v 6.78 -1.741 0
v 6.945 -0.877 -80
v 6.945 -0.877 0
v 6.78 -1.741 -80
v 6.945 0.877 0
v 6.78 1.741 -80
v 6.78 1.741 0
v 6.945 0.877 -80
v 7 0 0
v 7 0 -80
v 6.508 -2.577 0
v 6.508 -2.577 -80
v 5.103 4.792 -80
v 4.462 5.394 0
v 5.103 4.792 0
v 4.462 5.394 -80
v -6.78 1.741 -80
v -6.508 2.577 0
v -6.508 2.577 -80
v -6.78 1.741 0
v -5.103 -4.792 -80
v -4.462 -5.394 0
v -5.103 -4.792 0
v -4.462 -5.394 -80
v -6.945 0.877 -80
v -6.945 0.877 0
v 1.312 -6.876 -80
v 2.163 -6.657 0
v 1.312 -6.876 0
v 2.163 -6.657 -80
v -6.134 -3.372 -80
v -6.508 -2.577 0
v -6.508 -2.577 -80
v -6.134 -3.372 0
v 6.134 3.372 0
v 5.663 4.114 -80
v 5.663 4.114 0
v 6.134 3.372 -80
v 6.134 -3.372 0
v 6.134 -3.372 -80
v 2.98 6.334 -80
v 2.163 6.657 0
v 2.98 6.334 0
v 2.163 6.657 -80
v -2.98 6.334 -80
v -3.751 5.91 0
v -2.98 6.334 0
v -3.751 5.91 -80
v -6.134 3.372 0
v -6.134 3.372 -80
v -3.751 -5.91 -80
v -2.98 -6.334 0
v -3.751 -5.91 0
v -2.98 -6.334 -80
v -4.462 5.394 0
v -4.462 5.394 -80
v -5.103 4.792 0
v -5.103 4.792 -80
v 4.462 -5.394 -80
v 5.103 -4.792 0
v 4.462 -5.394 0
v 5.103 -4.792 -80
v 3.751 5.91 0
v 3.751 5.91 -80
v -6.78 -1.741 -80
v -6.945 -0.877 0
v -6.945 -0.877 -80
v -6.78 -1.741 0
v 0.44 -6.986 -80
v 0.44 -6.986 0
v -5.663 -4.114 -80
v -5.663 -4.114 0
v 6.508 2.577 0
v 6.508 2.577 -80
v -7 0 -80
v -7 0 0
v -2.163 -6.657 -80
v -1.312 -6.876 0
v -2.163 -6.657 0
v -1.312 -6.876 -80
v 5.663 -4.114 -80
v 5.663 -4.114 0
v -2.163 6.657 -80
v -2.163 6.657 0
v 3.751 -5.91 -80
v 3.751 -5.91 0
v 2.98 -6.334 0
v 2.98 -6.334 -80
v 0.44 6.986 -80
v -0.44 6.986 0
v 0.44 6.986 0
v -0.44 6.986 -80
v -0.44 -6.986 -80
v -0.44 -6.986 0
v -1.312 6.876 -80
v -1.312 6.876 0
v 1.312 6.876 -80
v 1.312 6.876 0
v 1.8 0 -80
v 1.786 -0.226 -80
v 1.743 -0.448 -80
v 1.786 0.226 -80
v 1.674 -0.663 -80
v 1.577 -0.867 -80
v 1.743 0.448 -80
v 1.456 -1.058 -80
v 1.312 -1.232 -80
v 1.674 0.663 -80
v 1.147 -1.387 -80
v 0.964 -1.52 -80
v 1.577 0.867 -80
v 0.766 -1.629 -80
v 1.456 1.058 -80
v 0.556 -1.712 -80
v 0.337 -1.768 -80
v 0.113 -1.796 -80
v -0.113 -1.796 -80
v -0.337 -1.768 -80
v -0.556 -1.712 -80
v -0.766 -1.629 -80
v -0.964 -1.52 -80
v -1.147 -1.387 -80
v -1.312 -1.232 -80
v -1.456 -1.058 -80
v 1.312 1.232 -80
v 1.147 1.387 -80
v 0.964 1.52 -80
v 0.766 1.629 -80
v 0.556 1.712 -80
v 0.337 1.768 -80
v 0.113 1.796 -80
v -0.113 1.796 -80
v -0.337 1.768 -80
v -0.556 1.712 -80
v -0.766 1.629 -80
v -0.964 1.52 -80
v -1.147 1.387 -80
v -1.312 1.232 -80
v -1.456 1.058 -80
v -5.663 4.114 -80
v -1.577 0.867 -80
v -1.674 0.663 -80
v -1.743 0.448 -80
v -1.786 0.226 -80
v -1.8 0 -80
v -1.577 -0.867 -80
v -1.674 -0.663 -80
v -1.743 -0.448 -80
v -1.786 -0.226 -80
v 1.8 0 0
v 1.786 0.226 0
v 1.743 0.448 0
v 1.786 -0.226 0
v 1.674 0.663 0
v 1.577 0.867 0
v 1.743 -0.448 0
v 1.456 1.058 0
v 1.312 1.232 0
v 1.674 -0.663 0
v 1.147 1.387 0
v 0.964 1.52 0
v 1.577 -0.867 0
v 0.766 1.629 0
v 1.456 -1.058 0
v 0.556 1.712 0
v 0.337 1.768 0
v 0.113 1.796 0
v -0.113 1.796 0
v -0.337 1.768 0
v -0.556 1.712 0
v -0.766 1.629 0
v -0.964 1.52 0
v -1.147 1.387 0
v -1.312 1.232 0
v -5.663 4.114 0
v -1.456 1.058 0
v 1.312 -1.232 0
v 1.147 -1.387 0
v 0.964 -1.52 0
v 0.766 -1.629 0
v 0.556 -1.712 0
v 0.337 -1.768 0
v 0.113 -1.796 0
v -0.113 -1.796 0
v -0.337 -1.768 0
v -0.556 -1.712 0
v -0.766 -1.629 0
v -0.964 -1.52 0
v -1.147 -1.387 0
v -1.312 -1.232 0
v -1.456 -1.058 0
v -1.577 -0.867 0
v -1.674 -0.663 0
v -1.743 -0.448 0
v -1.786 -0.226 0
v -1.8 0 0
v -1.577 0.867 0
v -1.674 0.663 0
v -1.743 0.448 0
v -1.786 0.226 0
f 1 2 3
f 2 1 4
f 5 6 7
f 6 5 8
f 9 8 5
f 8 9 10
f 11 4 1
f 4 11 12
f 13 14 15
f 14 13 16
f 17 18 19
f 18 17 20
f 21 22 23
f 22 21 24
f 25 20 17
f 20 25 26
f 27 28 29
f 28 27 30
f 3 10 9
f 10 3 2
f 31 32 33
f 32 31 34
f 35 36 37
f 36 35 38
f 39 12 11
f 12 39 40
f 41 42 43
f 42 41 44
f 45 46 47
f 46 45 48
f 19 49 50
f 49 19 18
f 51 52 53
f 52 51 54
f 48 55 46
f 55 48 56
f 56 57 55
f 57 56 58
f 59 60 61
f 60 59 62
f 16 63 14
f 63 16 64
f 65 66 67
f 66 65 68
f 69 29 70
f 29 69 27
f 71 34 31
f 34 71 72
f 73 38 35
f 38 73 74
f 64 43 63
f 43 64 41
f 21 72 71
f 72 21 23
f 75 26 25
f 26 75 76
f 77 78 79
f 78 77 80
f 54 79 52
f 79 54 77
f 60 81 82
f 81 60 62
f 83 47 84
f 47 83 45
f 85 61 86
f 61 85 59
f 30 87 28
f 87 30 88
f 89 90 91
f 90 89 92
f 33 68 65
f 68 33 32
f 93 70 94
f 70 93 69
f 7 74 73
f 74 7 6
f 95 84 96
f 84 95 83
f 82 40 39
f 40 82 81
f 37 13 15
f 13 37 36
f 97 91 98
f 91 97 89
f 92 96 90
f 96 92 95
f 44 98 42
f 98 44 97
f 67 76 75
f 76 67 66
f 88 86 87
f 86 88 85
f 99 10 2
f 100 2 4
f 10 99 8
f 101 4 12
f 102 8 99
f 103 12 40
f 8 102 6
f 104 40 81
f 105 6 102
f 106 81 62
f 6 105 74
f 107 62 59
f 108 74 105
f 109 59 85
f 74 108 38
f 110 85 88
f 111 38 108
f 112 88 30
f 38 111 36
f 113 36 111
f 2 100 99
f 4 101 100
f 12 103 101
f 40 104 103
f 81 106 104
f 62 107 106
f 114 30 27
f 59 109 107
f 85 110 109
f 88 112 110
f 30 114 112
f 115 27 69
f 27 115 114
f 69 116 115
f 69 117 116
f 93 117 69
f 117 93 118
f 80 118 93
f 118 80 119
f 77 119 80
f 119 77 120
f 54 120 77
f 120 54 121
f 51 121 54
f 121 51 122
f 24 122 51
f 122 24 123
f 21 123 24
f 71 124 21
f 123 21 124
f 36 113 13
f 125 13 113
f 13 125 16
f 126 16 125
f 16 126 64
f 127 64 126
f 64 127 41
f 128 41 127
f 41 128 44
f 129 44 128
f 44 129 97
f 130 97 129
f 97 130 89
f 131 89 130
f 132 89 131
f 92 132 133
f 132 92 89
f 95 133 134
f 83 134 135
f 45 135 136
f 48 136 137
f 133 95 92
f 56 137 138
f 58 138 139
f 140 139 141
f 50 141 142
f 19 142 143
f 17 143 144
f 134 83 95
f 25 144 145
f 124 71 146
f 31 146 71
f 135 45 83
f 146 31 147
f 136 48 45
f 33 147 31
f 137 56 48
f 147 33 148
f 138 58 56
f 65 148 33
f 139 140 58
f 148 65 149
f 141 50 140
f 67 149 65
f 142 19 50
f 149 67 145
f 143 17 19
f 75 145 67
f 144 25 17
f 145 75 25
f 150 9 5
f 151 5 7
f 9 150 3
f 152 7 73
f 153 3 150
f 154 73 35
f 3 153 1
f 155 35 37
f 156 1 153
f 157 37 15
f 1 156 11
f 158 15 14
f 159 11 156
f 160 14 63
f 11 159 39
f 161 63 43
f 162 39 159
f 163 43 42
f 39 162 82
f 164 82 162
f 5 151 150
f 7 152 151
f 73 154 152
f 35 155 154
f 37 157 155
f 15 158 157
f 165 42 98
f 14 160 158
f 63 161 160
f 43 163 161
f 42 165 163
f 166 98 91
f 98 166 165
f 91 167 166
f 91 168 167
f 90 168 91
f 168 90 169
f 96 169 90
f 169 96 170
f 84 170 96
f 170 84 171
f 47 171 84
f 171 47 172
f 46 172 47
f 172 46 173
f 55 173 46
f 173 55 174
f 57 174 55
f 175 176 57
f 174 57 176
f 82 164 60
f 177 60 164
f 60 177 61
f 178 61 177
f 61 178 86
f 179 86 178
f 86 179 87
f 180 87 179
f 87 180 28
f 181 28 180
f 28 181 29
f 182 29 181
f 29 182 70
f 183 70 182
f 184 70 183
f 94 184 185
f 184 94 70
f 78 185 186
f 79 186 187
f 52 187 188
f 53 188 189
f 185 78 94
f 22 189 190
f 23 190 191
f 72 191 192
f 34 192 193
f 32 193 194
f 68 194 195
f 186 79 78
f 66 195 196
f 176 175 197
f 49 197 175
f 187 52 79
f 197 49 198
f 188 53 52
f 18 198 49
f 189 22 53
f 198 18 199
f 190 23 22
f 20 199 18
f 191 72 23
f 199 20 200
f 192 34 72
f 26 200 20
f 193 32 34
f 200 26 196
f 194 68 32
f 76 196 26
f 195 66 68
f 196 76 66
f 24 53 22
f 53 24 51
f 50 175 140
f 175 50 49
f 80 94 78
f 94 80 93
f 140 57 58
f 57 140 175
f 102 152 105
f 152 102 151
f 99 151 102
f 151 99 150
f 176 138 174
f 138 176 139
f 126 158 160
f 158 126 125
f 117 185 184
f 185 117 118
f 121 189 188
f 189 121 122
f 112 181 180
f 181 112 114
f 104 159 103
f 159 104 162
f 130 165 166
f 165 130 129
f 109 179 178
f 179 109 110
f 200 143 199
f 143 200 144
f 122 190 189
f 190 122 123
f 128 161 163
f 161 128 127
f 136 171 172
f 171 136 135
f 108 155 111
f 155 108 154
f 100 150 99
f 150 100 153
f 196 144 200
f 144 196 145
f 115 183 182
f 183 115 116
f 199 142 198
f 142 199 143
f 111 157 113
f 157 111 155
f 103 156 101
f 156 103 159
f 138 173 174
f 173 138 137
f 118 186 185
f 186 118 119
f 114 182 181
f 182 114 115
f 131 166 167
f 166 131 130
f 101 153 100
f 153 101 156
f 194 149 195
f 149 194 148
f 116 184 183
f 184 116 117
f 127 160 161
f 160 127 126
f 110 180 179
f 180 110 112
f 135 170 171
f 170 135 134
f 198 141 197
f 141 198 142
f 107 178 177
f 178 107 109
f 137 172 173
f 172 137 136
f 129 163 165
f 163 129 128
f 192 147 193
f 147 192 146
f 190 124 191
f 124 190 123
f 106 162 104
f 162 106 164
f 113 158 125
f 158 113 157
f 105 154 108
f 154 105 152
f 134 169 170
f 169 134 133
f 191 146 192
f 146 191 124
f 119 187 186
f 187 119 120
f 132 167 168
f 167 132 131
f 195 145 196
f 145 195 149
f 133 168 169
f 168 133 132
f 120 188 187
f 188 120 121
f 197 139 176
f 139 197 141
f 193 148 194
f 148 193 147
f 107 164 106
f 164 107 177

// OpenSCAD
$fn = 50;


difference() {
	union() {
		translate(v = [0, 0, -80.0000000000]) {
			cylinder(h = 80, r = 7.0000000000);
		}
		cylinder(h = 0, r = 10.0000000000);
	}
	union() {
		#translate(v = [0, 0, -80]) {
			cylinder(h = 80, r = 1.8000000000);
		}
	}
}
